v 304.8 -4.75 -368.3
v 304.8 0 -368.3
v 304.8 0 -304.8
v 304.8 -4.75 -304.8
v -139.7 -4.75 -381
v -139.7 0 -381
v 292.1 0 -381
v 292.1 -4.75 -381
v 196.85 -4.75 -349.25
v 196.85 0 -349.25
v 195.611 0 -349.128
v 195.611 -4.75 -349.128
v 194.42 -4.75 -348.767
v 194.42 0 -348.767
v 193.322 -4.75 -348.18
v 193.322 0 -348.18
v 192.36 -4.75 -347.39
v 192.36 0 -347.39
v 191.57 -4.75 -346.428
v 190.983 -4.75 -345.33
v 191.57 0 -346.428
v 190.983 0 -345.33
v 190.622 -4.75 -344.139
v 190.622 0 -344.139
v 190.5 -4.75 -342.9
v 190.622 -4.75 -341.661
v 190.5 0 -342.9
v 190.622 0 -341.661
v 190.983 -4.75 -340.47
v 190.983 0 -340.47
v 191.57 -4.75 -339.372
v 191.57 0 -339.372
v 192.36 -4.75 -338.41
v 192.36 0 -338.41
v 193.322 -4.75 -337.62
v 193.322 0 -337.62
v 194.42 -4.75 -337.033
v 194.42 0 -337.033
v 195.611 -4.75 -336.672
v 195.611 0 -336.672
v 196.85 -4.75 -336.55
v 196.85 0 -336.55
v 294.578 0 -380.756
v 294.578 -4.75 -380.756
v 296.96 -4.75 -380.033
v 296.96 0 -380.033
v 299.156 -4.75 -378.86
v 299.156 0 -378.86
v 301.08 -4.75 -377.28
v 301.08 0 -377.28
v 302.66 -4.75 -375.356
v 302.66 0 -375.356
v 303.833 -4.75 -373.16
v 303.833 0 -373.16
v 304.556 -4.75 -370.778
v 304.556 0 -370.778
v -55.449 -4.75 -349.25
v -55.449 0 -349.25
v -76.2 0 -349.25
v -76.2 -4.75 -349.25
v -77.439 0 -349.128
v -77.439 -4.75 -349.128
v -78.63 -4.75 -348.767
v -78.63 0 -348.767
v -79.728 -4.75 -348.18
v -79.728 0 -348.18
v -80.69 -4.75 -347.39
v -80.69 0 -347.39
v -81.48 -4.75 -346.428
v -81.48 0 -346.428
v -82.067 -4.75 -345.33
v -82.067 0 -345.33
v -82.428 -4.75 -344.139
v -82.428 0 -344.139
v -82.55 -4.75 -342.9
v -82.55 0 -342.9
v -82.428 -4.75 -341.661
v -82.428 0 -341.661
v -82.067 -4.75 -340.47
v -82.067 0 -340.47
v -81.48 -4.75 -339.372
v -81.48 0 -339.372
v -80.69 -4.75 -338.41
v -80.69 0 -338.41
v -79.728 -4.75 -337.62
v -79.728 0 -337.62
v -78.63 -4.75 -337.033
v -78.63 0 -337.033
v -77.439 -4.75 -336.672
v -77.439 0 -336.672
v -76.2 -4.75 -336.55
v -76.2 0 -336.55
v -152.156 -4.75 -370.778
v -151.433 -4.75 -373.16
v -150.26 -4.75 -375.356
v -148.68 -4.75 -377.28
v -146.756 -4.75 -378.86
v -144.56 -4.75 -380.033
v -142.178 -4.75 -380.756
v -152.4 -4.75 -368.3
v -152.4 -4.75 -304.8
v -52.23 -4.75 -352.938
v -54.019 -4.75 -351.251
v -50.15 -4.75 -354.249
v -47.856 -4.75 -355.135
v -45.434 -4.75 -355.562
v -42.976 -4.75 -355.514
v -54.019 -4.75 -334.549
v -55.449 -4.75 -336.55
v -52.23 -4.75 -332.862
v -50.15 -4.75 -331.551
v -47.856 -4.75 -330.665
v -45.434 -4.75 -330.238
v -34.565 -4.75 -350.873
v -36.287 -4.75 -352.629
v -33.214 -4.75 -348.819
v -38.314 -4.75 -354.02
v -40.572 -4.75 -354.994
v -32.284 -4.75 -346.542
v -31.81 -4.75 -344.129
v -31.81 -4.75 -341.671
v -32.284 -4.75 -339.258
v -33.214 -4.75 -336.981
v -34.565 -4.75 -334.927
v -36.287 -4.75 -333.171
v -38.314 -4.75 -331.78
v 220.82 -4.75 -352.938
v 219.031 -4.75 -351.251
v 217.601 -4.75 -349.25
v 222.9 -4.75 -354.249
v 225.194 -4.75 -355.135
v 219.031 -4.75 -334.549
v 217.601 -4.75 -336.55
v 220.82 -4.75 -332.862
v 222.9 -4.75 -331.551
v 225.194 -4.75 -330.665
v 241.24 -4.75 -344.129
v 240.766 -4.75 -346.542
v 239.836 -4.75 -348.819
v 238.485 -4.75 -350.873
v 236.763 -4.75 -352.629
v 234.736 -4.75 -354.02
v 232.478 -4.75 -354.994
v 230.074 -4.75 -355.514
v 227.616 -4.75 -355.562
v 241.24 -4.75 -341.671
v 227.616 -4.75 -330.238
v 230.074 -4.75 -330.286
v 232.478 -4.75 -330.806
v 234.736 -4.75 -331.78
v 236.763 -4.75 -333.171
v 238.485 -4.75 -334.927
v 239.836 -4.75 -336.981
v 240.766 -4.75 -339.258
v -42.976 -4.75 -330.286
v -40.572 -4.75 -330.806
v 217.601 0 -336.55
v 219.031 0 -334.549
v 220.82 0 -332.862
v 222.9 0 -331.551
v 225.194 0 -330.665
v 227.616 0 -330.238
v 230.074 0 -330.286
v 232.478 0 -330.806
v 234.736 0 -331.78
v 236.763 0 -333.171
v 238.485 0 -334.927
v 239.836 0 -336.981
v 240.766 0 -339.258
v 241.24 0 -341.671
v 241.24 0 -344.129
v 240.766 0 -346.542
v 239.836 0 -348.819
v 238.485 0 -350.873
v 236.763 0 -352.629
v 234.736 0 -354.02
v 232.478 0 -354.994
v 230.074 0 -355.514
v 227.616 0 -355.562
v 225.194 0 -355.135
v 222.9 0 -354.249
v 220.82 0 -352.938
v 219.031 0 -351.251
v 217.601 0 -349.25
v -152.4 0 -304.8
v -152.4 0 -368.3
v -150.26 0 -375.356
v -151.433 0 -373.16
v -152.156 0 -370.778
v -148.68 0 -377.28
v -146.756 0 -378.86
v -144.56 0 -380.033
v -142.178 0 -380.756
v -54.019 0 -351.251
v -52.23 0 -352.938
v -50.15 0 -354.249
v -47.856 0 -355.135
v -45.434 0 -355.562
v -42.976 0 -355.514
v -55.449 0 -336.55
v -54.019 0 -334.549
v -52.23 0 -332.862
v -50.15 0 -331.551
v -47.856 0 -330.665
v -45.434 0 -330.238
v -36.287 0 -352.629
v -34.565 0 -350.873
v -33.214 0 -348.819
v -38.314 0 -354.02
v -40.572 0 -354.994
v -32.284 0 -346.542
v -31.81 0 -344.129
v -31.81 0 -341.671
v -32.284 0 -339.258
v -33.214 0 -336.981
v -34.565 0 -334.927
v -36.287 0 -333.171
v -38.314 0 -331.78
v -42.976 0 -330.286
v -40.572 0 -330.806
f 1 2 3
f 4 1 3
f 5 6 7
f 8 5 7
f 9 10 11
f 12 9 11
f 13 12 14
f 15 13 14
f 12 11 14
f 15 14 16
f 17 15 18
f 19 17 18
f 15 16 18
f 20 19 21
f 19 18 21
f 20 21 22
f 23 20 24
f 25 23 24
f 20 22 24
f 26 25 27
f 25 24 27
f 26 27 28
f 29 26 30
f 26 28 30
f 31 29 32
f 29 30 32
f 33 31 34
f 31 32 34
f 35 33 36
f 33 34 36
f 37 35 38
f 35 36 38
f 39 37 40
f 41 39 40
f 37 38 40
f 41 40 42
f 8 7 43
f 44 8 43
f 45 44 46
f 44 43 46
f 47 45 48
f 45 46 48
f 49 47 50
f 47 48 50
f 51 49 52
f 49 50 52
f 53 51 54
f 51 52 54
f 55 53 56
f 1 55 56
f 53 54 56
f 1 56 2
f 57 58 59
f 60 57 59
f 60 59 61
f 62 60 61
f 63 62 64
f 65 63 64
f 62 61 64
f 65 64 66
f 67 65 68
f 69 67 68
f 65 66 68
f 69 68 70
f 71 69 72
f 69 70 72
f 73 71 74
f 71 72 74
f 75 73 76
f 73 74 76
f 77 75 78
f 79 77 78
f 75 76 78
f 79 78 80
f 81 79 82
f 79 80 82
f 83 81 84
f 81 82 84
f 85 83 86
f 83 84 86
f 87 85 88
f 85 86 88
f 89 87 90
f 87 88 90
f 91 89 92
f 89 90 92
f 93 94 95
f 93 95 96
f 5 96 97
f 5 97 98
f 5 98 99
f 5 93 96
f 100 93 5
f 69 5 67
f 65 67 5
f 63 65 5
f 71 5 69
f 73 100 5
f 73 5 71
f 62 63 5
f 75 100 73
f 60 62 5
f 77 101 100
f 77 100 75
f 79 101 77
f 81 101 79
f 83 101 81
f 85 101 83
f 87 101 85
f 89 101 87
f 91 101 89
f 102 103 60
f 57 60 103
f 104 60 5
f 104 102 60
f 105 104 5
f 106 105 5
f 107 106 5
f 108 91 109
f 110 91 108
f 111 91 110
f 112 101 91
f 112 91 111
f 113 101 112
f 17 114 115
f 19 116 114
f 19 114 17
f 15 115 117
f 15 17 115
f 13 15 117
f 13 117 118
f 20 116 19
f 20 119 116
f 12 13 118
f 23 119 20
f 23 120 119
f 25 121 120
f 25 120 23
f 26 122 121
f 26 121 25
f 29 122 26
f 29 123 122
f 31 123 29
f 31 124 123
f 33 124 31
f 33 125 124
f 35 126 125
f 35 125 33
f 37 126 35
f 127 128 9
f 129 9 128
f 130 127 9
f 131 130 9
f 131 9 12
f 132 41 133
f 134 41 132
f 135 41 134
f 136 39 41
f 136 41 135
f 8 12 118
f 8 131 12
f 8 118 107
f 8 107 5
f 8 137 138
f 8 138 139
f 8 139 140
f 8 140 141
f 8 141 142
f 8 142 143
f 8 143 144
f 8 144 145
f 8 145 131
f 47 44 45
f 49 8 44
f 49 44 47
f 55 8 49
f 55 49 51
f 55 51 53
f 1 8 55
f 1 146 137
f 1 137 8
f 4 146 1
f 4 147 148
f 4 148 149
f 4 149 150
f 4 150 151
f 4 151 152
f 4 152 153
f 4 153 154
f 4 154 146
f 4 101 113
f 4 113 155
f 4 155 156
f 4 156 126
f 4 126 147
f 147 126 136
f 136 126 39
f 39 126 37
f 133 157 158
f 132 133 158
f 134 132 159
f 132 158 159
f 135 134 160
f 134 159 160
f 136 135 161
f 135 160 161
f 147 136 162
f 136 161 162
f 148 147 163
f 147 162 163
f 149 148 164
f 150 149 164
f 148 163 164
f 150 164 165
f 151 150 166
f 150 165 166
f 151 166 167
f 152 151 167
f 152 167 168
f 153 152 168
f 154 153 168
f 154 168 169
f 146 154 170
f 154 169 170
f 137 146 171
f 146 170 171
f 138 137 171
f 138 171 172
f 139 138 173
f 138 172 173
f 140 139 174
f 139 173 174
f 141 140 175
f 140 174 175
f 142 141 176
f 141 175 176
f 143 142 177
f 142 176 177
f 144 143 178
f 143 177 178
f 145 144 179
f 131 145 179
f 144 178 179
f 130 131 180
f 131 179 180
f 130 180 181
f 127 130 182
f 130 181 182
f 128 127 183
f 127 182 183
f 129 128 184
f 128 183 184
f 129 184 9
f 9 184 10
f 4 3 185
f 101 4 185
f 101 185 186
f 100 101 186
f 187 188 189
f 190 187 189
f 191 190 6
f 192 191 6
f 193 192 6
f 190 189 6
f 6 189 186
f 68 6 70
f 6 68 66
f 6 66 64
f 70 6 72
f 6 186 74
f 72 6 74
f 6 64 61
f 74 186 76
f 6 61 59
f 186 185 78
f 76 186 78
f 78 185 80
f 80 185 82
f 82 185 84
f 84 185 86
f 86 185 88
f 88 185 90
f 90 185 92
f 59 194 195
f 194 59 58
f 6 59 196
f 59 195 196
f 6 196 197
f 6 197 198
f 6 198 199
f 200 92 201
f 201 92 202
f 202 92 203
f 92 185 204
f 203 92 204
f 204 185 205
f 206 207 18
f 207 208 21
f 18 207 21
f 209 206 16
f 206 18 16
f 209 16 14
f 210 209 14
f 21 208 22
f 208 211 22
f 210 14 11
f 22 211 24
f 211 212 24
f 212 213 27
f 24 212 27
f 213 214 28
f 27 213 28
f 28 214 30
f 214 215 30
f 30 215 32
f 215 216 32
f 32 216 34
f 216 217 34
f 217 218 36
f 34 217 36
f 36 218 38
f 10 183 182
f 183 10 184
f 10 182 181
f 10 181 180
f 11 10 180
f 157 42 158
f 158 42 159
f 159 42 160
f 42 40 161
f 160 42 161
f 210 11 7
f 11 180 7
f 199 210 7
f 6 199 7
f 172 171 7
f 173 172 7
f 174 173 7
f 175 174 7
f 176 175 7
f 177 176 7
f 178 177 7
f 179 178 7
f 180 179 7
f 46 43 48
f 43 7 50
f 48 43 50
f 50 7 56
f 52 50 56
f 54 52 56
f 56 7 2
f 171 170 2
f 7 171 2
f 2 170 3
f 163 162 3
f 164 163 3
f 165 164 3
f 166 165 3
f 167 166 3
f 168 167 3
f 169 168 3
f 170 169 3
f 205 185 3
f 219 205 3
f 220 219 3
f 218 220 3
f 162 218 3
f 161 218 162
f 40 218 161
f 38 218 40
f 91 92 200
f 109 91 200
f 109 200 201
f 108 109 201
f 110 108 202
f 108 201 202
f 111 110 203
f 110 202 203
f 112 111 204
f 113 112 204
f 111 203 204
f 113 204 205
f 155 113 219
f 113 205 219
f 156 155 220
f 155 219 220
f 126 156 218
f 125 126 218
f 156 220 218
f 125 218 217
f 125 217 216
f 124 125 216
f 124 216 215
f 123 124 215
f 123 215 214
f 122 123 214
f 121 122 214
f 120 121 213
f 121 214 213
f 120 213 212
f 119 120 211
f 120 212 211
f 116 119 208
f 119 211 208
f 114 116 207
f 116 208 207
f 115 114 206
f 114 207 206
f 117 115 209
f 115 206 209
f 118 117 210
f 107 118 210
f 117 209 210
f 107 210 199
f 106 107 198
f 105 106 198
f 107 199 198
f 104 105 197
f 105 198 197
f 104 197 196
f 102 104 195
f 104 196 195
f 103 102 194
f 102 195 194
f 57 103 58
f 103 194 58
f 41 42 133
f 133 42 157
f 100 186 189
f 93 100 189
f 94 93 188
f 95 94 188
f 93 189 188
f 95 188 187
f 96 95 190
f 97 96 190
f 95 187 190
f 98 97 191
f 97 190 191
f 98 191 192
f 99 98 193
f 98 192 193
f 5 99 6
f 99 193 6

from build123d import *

# Parameters (mm, degrees)
F1_DEPTH = 4.7498


# Not quite as in the source:
# - a feature names something its author has since deleted; it is built from what else it names


with BuildPart() as f1:
    # F0 (on Front) → F1 (new body)
    with BuildSketch(Plane.XZ):
        with BuildLine():
            Line((304.8, -368.3), (304.8, -304.8))
            Line((304.8, -304.8), (0, -304.8))
            Line((0, -304.8), (-152.4, -304.8))
            Line((-152.4, -304.8), (-152.4, -368.3))
            ThreePointArc((-152.4, -368.3), (-148.6802561211, -377.2802561211), (-139.7, -381))
            Line((-139.7, -381), (292.1, -381))
            ThreePointArc((292.1, -381), (301.0802561211, -377.2802561211), (304.8, -368.3))
        make_face()
        with BuildLine():
            ThreePointArc((-55.4485226281, -336.55), (-31.75, -342.9), (-55.4485226281, -349.25))
            Line((-55.4485226281, -349.25), (-76.2, -349.25))
            ThreePointArc((-76.2, -349.25), (-82.55, -342.9), (-76.2, -336.55))
            Line((-76.2, -336.55), (-55.4485226281, -336.55))
        make_face(mode=Mode.SUBTRACT)
        with BuildLine():
            ThreePointArc((217.6014773719, -336.55), (241.3, -342.9), (217.6014773719, -349.25))
            Line((217.6014773719, -349.25), (196.85, -349.25))
            ThreePointArc((196.85, -349.25), (190.5, -342.9), (196.85, -336.55))
            Line((196.85, -336.55), (217.6014773719, -336.55))
        make_face(mode=Mode.SUBTRACT)
    extrude(amount=F1_DEPTH)


solid = f1.part
